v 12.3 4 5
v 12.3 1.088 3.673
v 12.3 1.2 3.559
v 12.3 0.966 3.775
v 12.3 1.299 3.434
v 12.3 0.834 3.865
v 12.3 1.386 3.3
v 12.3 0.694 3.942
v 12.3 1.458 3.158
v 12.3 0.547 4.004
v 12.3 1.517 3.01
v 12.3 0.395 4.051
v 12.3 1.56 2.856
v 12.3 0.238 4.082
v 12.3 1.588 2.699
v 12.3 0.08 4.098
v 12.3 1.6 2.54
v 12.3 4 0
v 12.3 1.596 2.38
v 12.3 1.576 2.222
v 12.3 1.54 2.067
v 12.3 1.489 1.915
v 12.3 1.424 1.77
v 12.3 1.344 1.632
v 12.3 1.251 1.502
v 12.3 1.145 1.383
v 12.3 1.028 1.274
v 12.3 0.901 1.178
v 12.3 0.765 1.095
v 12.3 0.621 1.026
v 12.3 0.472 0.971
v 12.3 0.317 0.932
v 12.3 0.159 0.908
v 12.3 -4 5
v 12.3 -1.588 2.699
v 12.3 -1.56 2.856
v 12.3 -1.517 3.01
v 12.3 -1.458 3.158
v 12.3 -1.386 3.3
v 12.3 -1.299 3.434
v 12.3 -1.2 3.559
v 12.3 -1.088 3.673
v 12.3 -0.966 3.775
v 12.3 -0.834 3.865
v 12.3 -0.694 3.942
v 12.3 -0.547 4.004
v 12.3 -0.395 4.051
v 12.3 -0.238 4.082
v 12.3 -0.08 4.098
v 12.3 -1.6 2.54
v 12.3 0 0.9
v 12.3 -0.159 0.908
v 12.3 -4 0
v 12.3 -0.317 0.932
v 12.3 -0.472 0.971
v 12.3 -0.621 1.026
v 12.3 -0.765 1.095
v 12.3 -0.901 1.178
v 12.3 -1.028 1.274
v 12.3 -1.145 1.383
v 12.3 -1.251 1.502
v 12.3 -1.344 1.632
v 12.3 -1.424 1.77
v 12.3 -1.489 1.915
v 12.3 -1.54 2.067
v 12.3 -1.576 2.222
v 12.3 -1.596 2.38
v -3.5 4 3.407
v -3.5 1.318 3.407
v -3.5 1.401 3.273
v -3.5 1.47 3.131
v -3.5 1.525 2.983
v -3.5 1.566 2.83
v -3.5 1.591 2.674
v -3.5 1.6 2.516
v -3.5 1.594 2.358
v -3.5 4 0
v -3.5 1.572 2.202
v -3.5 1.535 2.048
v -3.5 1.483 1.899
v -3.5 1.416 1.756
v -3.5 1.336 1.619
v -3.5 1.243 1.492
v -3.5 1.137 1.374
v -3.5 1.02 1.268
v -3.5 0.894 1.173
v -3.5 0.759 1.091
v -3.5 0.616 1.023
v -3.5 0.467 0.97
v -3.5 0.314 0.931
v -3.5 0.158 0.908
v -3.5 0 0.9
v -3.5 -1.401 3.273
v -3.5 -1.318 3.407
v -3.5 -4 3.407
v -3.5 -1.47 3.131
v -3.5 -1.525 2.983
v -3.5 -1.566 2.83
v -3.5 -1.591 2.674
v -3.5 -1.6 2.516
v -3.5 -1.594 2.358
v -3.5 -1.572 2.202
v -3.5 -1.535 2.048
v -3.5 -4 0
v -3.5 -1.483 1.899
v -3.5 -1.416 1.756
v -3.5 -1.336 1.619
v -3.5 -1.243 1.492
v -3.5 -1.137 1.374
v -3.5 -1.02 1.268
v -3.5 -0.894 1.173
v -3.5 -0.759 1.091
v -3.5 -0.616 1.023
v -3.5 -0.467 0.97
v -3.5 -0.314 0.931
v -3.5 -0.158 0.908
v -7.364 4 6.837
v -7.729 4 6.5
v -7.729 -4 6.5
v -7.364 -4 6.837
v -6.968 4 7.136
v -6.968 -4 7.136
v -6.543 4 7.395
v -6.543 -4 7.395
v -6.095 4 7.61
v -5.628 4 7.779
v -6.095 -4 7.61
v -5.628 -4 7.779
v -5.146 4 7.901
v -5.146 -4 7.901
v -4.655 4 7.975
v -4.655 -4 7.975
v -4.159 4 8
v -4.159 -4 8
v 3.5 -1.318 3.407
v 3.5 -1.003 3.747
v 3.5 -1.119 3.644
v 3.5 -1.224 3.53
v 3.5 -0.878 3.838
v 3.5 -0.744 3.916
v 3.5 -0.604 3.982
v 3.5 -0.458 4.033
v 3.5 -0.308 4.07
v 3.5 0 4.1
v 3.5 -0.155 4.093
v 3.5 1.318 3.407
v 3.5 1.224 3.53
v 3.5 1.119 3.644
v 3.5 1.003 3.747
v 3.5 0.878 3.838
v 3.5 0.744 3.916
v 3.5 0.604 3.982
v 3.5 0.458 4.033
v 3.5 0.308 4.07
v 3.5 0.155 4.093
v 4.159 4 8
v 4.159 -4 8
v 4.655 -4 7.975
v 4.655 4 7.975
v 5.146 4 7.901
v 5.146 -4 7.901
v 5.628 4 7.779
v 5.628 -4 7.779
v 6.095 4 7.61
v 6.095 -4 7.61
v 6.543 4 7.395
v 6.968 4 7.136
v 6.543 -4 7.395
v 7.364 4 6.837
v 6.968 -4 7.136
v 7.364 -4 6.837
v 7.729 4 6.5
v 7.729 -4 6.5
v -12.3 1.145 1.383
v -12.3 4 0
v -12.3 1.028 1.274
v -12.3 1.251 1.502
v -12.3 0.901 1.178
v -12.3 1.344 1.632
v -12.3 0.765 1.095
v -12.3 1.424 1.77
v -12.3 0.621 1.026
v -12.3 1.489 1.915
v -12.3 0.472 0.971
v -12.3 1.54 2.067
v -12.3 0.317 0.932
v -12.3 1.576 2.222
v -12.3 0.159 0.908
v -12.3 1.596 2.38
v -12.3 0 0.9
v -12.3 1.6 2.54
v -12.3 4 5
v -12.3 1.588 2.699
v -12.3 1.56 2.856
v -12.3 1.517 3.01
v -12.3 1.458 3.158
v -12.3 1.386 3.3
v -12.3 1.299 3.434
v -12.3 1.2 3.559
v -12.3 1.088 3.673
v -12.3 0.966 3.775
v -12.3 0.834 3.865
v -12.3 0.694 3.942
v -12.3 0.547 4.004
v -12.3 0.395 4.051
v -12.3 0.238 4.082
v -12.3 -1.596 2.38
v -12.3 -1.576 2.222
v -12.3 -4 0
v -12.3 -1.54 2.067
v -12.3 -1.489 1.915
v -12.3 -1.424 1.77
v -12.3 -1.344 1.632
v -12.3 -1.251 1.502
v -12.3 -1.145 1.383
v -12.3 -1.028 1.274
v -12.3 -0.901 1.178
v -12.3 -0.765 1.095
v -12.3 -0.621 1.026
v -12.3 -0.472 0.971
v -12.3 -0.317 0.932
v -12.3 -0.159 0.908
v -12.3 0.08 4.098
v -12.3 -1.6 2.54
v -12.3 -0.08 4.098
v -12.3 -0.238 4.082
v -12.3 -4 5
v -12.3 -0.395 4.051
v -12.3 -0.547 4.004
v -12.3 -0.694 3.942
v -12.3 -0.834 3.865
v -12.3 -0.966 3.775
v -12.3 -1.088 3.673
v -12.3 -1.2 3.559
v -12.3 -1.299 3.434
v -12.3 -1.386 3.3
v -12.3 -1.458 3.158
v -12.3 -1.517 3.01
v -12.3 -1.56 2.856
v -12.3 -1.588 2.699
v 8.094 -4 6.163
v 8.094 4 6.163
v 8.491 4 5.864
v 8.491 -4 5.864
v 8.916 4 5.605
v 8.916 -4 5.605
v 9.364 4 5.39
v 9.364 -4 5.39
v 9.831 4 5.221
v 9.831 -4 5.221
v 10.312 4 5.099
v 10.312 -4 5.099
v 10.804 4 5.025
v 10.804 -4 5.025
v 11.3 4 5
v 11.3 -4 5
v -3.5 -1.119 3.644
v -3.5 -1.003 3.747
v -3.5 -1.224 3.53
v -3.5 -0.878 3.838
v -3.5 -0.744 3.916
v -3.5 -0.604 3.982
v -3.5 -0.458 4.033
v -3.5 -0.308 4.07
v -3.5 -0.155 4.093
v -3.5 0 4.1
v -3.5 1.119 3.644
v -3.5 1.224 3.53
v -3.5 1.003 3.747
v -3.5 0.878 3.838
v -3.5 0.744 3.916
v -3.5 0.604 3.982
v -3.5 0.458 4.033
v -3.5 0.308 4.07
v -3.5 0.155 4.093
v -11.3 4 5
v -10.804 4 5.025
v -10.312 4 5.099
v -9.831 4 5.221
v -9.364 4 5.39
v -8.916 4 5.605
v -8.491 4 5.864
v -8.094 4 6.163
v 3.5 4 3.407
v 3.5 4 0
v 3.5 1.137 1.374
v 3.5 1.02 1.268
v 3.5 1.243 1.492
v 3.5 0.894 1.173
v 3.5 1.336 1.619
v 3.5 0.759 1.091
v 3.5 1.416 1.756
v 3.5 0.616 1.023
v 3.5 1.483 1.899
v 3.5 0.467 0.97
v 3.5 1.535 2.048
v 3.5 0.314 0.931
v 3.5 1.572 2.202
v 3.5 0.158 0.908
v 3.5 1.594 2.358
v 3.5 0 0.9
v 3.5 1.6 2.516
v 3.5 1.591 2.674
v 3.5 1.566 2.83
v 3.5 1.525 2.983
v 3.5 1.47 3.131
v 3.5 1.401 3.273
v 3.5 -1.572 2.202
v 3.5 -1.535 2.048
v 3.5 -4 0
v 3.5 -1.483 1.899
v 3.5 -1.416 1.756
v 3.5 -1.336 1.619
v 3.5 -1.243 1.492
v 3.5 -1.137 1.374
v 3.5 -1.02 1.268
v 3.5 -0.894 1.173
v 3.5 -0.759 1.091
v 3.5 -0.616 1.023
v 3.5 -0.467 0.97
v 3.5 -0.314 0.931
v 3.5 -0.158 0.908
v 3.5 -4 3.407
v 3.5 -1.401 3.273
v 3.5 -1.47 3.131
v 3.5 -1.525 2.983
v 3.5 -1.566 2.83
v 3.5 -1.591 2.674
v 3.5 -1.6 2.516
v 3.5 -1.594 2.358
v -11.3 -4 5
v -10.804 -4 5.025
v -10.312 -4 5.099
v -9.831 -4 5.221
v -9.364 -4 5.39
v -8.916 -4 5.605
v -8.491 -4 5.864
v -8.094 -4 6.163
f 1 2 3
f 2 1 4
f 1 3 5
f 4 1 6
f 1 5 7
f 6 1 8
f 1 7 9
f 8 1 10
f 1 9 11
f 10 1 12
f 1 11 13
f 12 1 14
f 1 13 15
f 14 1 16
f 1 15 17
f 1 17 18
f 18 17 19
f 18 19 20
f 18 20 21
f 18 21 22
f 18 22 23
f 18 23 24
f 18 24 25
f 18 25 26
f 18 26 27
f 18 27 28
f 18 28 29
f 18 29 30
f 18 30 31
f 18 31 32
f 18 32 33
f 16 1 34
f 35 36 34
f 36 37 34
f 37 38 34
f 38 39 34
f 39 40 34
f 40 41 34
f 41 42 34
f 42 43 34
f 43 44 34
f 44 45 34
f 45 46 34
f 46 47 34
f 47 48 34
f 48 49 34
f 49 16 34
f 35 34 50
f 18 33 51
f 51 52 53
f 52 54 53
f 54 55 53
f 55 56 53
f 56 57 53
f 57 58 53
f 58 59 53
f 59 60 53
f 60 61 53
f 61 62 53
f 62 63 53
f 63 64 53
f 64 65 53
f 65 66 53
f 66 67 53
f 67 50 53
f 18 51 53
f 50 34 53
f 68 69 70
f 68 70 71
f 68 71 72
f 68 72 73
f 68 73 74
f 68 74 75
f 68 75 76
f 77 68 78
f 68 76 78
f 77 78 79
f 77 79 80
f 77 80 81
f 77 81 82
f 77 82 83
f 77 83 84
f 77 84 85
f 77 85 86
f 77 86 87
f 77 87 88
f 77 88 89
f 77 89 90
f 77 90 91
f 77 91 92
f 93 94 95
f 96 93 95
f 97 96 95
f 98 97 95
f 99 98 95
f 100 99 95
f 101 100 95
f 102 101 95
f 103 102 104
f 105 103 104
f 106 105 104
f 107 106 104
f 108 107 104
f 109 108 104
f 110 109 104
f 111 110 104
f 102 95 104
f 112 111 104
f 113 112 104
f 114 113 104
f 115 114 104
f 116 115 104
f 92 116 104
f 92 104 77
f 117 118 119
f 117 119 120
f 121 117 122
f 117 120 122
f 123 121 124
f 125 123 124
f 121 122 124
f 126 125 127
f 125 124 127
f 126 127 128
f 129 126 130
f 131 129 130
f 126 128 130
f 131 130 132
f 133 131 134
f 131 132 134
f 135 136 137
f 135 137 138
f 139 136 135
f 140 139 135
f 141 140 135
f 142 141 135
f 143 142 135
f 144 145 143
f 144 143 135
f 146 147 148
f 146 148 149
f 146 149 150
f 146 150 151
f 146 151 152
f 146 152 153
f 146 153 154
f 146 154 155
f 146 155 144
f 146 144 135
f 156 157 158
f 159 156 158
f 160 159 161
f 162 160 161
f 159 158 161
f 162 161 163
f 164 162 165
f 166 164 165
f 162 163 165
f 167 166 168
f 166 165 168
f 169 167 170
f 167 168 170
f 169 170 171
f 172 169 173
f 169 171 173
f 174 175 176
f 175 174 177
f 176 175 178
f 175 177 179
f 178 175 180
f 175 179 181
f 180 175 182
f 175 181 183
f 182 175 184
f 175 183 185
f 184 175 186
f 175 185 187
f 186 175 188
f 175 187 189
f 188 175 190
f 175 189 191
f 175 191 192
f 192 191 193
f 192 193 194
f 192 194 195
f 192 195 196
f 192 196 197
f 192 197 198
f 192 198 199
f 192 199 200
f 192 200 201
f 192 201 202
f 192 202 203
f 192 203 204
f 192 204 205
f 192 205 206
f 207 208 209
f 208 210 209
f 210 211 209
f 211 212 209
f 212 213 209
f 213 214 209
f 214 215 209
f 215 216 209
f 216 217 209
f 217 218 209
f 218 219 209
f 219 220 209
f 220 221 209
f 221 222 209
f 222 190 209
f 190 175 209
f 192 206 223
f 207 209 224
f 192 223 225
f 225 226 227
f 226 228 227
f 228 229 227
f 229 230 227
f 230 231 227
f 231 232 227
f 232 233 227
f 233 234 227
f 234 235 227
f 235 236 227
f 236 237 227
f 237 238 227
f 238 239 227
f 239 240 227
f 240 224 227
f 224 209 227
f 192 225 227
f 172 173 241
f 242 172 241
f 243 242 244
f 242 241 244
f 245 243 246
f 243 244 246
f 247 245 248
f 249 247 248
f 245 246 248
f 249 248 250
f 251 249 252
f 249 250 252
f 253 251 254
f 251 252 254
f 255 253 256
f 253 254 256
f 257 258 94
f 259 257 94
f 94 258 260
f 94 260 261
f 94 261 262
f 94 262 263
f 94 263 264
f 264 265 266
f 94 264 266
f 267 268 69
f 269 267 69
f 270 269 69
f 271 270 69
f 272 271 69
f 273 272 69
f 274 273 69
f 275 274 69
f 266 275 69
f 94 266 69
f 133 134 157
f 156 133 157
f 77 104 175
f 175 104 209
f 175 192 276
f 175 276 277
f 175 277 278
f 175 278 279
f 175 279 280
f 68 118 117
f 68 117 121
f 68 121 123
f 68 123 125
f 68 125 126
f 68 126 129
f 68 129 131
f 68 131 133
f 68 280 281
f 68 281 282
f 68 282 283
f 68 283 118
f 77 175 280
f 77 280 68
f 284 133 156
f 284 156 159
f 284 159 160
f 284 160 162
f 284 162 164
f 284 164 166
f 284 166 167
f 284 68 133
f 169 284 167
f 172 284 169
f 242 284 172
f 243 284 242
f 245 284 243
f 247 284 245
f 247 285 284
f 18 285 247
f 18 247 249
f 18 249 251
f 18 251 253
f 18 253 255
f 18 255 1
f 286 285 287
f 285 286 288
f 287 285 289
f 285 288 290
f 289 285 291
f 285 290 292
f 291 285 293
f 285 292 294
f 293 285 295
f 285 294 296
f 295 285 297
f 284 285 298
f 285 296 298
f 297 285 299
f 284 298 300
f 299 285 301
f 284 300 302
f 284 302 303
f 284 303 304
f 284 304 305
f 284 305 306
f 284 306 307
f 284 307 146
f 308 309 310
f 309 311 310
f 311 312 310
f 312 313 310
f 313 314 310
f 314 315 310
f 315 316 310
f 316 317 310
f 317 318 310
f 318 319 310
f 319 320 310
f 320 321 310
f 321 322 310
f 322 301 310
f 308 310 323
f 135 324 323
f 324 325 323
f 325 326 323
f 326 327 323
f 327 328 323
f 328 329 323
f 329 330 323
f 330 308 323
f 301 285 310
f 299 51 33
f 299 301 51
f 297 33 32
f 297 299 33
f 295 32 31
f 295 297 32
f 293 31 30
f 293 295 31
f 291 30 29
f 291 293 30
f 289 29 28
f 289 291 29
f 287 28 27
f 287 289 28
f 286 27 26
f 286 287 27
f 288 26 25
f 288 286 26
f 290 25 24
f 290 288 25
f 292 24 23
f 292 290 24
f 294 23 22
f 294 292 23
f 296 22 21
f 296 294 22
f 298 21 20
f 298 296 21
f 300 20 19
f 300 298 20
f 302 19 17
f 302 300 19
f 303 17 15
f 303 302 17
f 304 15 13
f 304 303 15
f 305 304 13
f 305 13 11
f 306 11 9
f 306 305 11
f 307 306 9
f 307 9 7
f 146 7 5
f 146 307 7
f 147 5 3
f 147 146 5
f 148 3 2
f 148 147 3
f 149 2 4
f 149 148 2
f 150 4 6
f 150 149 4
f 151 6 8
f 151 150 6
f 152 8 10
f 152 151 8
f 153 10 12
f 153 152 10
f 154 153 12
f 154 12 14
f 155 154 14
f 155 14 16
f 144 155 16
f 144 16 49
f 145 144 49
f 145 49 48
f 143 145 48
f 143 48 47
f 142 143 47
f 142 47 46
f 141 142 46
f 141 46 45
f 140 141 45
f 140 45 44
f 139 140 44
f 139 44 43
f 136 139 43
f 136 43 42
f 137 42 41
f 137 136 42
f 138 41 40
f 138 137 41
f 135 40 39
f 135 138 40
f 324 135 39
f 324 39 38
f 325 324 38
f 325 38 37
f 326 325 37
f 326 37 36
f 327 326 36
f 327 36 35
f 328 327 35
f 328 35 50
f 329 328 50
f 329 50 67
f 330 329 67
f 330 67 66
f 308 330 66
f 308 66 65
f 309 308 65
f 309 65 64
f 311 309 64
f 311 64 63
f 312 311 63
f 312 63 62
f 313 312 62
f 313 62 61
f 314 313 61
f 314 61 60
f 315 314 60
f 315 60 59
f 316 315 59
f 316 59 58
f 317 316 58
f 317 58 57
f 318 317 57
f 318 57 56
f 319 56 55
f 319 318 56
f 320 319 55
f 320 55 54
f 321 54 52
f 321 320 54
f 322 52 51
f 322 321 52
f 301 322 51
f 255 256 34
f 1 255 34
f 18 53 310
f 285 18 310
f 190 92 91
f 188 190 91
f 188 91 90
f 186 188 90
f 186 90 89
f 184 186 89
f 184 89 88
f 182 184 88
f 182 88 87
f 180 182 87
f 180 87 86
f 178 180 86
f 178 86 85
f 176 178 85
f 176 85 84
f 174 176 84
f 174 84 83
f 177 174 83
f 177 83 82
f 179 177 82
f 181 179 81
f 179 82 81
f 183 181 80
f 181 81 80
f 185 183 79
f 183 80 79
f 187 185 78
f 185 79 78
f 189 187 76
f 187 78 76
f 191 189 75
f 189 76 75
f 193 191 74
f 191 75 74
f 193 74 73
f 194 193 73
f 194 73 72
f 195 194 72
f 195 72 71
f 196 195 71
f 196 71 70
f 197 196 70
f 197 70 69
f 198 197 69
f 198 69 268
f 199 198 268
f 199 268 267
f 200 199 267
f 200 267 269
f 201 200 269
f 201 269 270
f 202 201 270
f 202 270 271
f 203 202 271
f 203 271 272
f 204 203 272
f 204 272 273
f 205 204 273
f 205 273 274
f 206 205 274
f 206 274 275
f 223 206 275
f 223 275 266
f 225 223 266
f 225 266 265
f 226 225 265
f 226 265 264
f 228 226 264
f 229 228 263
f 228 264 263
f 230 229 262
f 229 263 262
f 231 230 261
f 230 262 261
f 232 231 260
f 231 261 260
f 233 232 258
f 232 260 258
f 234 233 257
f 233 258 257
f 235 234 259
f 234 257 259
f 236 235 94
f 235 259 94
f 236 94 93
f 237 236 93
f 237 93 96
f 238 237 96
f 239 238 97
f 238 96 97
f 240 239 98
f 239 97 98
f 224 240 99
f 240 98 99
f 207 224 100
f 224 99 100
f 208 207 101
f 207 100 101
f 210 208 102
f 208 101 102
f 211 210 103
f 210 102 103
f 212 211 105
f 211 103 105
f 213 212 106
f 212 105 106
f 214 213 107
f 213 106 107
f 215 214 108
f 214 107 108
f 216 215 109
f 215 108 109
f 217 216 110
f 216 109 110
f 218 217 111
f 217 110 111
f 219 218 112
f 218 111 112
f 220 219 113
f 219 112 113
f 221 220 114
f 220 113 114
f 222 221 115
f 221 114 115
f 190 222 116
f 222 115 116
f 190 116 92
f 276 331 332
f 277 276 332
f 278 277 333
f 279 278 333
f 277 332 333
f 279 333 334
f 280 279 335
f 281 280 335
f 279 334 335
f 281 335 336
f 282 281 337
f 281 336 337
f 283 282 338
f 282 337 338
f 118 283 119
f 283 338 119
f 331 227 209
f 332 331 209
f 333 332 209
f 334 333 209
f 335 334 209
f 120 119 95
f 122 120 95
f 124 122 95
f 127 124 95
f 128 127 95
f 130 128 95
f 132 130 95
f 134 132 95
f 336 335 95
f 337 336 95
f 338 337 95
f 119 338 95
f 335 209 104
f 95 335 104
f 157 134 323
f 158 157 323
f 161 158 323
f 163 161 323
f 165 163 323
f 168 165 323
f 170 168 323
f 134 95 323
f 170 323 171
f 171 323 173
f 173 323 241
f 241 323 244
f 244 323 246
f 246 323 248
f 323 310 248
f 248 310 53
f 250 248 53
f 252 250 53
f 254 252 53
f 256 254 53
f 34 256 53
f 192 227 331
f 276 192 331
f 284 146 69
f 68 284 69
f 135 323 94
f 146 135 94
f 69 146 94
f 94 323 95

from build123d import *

# Parameters (mm, degrees)
BOSS_EXTRUDE1_START      = -4
BOSS_EXTRUDE1_DEPTH      = 8
M3_CLEARANCE_HOLE1_D     = 3.2
M3_CLEARANCE_HOLE1_DEPTH = 8.8


with BuildPart() as part:
    # Sketch2 → Boss-Extrude1 (new body)
    with BuildSketch(Plane(origin=(0, 0, 0), x_dir=(1, 0, 0), z_dir=(0, 1, 0)).offset(BOSS_EXTRUDE1_START)):
        with BuildLine():
            ThreePointArc((-7.729285786, -6.5), (-6.095063245, -7.609772229), (-4.158571571, -8))
            Line((-4.158571571, -8), (4.158571571, -8))
            ThreePointArc((4.158571571, -8), (6.095063245, -7.609772229), (7.729285786, -6.5))
            ThreePointArc((7.729285786, -6.5), (9.363508327, -5.390227771), (11.3, -5))
            Line((11.3, -5), (12.3, -5))
            Line((12.3, -5), (12.3, 0))
            Line((12.3, 0), (11.3, 0))
            Line((11.3, 0), (3.5, 0))
            Line((3.5, 0), (3.5, -3.407197308))
            Line((3.5, -3.407197308), (-3.5, -3.407197308))
            Line((-3.5, -3.407197308), (-3.5, 0))
            Line((-3.5, 0), (-11.3, 0))
            Line((-11.3, 0), (-12.3, 0))
            Line((-12.3, 0), (-12.3, -5))
            Line((-12.3, -5), (-11.3, -5))
            ThreePointArc((-11.3, -5), (-9.363508327, -5.390227771), (-7.729285786, -6.5))
        make_face()
    extrude(amount=BOSS_EXTRUDE1_DEPTH)

    # M3 Clearance Hole1
    with Locations(Plane.ZY.offset(12.3)):
        with Locations((2.5, 0)):
            m3_clearance_hole1 = Hole(M3_CLEARANCE_HOLE1_D / 2, depth=M3_CLEARANCE_HOLE1_DEPTH)

    # Mirror1: M3 Clearance Hole1 across plane
    add(m3_clearance_hole1.mirror(Plane(origin=(0, 0, 0), x_dir=(0, 0, 1), z_dir=(1, 0, 0))), mode=Mode.SUBTRACT)


solid = part.part
